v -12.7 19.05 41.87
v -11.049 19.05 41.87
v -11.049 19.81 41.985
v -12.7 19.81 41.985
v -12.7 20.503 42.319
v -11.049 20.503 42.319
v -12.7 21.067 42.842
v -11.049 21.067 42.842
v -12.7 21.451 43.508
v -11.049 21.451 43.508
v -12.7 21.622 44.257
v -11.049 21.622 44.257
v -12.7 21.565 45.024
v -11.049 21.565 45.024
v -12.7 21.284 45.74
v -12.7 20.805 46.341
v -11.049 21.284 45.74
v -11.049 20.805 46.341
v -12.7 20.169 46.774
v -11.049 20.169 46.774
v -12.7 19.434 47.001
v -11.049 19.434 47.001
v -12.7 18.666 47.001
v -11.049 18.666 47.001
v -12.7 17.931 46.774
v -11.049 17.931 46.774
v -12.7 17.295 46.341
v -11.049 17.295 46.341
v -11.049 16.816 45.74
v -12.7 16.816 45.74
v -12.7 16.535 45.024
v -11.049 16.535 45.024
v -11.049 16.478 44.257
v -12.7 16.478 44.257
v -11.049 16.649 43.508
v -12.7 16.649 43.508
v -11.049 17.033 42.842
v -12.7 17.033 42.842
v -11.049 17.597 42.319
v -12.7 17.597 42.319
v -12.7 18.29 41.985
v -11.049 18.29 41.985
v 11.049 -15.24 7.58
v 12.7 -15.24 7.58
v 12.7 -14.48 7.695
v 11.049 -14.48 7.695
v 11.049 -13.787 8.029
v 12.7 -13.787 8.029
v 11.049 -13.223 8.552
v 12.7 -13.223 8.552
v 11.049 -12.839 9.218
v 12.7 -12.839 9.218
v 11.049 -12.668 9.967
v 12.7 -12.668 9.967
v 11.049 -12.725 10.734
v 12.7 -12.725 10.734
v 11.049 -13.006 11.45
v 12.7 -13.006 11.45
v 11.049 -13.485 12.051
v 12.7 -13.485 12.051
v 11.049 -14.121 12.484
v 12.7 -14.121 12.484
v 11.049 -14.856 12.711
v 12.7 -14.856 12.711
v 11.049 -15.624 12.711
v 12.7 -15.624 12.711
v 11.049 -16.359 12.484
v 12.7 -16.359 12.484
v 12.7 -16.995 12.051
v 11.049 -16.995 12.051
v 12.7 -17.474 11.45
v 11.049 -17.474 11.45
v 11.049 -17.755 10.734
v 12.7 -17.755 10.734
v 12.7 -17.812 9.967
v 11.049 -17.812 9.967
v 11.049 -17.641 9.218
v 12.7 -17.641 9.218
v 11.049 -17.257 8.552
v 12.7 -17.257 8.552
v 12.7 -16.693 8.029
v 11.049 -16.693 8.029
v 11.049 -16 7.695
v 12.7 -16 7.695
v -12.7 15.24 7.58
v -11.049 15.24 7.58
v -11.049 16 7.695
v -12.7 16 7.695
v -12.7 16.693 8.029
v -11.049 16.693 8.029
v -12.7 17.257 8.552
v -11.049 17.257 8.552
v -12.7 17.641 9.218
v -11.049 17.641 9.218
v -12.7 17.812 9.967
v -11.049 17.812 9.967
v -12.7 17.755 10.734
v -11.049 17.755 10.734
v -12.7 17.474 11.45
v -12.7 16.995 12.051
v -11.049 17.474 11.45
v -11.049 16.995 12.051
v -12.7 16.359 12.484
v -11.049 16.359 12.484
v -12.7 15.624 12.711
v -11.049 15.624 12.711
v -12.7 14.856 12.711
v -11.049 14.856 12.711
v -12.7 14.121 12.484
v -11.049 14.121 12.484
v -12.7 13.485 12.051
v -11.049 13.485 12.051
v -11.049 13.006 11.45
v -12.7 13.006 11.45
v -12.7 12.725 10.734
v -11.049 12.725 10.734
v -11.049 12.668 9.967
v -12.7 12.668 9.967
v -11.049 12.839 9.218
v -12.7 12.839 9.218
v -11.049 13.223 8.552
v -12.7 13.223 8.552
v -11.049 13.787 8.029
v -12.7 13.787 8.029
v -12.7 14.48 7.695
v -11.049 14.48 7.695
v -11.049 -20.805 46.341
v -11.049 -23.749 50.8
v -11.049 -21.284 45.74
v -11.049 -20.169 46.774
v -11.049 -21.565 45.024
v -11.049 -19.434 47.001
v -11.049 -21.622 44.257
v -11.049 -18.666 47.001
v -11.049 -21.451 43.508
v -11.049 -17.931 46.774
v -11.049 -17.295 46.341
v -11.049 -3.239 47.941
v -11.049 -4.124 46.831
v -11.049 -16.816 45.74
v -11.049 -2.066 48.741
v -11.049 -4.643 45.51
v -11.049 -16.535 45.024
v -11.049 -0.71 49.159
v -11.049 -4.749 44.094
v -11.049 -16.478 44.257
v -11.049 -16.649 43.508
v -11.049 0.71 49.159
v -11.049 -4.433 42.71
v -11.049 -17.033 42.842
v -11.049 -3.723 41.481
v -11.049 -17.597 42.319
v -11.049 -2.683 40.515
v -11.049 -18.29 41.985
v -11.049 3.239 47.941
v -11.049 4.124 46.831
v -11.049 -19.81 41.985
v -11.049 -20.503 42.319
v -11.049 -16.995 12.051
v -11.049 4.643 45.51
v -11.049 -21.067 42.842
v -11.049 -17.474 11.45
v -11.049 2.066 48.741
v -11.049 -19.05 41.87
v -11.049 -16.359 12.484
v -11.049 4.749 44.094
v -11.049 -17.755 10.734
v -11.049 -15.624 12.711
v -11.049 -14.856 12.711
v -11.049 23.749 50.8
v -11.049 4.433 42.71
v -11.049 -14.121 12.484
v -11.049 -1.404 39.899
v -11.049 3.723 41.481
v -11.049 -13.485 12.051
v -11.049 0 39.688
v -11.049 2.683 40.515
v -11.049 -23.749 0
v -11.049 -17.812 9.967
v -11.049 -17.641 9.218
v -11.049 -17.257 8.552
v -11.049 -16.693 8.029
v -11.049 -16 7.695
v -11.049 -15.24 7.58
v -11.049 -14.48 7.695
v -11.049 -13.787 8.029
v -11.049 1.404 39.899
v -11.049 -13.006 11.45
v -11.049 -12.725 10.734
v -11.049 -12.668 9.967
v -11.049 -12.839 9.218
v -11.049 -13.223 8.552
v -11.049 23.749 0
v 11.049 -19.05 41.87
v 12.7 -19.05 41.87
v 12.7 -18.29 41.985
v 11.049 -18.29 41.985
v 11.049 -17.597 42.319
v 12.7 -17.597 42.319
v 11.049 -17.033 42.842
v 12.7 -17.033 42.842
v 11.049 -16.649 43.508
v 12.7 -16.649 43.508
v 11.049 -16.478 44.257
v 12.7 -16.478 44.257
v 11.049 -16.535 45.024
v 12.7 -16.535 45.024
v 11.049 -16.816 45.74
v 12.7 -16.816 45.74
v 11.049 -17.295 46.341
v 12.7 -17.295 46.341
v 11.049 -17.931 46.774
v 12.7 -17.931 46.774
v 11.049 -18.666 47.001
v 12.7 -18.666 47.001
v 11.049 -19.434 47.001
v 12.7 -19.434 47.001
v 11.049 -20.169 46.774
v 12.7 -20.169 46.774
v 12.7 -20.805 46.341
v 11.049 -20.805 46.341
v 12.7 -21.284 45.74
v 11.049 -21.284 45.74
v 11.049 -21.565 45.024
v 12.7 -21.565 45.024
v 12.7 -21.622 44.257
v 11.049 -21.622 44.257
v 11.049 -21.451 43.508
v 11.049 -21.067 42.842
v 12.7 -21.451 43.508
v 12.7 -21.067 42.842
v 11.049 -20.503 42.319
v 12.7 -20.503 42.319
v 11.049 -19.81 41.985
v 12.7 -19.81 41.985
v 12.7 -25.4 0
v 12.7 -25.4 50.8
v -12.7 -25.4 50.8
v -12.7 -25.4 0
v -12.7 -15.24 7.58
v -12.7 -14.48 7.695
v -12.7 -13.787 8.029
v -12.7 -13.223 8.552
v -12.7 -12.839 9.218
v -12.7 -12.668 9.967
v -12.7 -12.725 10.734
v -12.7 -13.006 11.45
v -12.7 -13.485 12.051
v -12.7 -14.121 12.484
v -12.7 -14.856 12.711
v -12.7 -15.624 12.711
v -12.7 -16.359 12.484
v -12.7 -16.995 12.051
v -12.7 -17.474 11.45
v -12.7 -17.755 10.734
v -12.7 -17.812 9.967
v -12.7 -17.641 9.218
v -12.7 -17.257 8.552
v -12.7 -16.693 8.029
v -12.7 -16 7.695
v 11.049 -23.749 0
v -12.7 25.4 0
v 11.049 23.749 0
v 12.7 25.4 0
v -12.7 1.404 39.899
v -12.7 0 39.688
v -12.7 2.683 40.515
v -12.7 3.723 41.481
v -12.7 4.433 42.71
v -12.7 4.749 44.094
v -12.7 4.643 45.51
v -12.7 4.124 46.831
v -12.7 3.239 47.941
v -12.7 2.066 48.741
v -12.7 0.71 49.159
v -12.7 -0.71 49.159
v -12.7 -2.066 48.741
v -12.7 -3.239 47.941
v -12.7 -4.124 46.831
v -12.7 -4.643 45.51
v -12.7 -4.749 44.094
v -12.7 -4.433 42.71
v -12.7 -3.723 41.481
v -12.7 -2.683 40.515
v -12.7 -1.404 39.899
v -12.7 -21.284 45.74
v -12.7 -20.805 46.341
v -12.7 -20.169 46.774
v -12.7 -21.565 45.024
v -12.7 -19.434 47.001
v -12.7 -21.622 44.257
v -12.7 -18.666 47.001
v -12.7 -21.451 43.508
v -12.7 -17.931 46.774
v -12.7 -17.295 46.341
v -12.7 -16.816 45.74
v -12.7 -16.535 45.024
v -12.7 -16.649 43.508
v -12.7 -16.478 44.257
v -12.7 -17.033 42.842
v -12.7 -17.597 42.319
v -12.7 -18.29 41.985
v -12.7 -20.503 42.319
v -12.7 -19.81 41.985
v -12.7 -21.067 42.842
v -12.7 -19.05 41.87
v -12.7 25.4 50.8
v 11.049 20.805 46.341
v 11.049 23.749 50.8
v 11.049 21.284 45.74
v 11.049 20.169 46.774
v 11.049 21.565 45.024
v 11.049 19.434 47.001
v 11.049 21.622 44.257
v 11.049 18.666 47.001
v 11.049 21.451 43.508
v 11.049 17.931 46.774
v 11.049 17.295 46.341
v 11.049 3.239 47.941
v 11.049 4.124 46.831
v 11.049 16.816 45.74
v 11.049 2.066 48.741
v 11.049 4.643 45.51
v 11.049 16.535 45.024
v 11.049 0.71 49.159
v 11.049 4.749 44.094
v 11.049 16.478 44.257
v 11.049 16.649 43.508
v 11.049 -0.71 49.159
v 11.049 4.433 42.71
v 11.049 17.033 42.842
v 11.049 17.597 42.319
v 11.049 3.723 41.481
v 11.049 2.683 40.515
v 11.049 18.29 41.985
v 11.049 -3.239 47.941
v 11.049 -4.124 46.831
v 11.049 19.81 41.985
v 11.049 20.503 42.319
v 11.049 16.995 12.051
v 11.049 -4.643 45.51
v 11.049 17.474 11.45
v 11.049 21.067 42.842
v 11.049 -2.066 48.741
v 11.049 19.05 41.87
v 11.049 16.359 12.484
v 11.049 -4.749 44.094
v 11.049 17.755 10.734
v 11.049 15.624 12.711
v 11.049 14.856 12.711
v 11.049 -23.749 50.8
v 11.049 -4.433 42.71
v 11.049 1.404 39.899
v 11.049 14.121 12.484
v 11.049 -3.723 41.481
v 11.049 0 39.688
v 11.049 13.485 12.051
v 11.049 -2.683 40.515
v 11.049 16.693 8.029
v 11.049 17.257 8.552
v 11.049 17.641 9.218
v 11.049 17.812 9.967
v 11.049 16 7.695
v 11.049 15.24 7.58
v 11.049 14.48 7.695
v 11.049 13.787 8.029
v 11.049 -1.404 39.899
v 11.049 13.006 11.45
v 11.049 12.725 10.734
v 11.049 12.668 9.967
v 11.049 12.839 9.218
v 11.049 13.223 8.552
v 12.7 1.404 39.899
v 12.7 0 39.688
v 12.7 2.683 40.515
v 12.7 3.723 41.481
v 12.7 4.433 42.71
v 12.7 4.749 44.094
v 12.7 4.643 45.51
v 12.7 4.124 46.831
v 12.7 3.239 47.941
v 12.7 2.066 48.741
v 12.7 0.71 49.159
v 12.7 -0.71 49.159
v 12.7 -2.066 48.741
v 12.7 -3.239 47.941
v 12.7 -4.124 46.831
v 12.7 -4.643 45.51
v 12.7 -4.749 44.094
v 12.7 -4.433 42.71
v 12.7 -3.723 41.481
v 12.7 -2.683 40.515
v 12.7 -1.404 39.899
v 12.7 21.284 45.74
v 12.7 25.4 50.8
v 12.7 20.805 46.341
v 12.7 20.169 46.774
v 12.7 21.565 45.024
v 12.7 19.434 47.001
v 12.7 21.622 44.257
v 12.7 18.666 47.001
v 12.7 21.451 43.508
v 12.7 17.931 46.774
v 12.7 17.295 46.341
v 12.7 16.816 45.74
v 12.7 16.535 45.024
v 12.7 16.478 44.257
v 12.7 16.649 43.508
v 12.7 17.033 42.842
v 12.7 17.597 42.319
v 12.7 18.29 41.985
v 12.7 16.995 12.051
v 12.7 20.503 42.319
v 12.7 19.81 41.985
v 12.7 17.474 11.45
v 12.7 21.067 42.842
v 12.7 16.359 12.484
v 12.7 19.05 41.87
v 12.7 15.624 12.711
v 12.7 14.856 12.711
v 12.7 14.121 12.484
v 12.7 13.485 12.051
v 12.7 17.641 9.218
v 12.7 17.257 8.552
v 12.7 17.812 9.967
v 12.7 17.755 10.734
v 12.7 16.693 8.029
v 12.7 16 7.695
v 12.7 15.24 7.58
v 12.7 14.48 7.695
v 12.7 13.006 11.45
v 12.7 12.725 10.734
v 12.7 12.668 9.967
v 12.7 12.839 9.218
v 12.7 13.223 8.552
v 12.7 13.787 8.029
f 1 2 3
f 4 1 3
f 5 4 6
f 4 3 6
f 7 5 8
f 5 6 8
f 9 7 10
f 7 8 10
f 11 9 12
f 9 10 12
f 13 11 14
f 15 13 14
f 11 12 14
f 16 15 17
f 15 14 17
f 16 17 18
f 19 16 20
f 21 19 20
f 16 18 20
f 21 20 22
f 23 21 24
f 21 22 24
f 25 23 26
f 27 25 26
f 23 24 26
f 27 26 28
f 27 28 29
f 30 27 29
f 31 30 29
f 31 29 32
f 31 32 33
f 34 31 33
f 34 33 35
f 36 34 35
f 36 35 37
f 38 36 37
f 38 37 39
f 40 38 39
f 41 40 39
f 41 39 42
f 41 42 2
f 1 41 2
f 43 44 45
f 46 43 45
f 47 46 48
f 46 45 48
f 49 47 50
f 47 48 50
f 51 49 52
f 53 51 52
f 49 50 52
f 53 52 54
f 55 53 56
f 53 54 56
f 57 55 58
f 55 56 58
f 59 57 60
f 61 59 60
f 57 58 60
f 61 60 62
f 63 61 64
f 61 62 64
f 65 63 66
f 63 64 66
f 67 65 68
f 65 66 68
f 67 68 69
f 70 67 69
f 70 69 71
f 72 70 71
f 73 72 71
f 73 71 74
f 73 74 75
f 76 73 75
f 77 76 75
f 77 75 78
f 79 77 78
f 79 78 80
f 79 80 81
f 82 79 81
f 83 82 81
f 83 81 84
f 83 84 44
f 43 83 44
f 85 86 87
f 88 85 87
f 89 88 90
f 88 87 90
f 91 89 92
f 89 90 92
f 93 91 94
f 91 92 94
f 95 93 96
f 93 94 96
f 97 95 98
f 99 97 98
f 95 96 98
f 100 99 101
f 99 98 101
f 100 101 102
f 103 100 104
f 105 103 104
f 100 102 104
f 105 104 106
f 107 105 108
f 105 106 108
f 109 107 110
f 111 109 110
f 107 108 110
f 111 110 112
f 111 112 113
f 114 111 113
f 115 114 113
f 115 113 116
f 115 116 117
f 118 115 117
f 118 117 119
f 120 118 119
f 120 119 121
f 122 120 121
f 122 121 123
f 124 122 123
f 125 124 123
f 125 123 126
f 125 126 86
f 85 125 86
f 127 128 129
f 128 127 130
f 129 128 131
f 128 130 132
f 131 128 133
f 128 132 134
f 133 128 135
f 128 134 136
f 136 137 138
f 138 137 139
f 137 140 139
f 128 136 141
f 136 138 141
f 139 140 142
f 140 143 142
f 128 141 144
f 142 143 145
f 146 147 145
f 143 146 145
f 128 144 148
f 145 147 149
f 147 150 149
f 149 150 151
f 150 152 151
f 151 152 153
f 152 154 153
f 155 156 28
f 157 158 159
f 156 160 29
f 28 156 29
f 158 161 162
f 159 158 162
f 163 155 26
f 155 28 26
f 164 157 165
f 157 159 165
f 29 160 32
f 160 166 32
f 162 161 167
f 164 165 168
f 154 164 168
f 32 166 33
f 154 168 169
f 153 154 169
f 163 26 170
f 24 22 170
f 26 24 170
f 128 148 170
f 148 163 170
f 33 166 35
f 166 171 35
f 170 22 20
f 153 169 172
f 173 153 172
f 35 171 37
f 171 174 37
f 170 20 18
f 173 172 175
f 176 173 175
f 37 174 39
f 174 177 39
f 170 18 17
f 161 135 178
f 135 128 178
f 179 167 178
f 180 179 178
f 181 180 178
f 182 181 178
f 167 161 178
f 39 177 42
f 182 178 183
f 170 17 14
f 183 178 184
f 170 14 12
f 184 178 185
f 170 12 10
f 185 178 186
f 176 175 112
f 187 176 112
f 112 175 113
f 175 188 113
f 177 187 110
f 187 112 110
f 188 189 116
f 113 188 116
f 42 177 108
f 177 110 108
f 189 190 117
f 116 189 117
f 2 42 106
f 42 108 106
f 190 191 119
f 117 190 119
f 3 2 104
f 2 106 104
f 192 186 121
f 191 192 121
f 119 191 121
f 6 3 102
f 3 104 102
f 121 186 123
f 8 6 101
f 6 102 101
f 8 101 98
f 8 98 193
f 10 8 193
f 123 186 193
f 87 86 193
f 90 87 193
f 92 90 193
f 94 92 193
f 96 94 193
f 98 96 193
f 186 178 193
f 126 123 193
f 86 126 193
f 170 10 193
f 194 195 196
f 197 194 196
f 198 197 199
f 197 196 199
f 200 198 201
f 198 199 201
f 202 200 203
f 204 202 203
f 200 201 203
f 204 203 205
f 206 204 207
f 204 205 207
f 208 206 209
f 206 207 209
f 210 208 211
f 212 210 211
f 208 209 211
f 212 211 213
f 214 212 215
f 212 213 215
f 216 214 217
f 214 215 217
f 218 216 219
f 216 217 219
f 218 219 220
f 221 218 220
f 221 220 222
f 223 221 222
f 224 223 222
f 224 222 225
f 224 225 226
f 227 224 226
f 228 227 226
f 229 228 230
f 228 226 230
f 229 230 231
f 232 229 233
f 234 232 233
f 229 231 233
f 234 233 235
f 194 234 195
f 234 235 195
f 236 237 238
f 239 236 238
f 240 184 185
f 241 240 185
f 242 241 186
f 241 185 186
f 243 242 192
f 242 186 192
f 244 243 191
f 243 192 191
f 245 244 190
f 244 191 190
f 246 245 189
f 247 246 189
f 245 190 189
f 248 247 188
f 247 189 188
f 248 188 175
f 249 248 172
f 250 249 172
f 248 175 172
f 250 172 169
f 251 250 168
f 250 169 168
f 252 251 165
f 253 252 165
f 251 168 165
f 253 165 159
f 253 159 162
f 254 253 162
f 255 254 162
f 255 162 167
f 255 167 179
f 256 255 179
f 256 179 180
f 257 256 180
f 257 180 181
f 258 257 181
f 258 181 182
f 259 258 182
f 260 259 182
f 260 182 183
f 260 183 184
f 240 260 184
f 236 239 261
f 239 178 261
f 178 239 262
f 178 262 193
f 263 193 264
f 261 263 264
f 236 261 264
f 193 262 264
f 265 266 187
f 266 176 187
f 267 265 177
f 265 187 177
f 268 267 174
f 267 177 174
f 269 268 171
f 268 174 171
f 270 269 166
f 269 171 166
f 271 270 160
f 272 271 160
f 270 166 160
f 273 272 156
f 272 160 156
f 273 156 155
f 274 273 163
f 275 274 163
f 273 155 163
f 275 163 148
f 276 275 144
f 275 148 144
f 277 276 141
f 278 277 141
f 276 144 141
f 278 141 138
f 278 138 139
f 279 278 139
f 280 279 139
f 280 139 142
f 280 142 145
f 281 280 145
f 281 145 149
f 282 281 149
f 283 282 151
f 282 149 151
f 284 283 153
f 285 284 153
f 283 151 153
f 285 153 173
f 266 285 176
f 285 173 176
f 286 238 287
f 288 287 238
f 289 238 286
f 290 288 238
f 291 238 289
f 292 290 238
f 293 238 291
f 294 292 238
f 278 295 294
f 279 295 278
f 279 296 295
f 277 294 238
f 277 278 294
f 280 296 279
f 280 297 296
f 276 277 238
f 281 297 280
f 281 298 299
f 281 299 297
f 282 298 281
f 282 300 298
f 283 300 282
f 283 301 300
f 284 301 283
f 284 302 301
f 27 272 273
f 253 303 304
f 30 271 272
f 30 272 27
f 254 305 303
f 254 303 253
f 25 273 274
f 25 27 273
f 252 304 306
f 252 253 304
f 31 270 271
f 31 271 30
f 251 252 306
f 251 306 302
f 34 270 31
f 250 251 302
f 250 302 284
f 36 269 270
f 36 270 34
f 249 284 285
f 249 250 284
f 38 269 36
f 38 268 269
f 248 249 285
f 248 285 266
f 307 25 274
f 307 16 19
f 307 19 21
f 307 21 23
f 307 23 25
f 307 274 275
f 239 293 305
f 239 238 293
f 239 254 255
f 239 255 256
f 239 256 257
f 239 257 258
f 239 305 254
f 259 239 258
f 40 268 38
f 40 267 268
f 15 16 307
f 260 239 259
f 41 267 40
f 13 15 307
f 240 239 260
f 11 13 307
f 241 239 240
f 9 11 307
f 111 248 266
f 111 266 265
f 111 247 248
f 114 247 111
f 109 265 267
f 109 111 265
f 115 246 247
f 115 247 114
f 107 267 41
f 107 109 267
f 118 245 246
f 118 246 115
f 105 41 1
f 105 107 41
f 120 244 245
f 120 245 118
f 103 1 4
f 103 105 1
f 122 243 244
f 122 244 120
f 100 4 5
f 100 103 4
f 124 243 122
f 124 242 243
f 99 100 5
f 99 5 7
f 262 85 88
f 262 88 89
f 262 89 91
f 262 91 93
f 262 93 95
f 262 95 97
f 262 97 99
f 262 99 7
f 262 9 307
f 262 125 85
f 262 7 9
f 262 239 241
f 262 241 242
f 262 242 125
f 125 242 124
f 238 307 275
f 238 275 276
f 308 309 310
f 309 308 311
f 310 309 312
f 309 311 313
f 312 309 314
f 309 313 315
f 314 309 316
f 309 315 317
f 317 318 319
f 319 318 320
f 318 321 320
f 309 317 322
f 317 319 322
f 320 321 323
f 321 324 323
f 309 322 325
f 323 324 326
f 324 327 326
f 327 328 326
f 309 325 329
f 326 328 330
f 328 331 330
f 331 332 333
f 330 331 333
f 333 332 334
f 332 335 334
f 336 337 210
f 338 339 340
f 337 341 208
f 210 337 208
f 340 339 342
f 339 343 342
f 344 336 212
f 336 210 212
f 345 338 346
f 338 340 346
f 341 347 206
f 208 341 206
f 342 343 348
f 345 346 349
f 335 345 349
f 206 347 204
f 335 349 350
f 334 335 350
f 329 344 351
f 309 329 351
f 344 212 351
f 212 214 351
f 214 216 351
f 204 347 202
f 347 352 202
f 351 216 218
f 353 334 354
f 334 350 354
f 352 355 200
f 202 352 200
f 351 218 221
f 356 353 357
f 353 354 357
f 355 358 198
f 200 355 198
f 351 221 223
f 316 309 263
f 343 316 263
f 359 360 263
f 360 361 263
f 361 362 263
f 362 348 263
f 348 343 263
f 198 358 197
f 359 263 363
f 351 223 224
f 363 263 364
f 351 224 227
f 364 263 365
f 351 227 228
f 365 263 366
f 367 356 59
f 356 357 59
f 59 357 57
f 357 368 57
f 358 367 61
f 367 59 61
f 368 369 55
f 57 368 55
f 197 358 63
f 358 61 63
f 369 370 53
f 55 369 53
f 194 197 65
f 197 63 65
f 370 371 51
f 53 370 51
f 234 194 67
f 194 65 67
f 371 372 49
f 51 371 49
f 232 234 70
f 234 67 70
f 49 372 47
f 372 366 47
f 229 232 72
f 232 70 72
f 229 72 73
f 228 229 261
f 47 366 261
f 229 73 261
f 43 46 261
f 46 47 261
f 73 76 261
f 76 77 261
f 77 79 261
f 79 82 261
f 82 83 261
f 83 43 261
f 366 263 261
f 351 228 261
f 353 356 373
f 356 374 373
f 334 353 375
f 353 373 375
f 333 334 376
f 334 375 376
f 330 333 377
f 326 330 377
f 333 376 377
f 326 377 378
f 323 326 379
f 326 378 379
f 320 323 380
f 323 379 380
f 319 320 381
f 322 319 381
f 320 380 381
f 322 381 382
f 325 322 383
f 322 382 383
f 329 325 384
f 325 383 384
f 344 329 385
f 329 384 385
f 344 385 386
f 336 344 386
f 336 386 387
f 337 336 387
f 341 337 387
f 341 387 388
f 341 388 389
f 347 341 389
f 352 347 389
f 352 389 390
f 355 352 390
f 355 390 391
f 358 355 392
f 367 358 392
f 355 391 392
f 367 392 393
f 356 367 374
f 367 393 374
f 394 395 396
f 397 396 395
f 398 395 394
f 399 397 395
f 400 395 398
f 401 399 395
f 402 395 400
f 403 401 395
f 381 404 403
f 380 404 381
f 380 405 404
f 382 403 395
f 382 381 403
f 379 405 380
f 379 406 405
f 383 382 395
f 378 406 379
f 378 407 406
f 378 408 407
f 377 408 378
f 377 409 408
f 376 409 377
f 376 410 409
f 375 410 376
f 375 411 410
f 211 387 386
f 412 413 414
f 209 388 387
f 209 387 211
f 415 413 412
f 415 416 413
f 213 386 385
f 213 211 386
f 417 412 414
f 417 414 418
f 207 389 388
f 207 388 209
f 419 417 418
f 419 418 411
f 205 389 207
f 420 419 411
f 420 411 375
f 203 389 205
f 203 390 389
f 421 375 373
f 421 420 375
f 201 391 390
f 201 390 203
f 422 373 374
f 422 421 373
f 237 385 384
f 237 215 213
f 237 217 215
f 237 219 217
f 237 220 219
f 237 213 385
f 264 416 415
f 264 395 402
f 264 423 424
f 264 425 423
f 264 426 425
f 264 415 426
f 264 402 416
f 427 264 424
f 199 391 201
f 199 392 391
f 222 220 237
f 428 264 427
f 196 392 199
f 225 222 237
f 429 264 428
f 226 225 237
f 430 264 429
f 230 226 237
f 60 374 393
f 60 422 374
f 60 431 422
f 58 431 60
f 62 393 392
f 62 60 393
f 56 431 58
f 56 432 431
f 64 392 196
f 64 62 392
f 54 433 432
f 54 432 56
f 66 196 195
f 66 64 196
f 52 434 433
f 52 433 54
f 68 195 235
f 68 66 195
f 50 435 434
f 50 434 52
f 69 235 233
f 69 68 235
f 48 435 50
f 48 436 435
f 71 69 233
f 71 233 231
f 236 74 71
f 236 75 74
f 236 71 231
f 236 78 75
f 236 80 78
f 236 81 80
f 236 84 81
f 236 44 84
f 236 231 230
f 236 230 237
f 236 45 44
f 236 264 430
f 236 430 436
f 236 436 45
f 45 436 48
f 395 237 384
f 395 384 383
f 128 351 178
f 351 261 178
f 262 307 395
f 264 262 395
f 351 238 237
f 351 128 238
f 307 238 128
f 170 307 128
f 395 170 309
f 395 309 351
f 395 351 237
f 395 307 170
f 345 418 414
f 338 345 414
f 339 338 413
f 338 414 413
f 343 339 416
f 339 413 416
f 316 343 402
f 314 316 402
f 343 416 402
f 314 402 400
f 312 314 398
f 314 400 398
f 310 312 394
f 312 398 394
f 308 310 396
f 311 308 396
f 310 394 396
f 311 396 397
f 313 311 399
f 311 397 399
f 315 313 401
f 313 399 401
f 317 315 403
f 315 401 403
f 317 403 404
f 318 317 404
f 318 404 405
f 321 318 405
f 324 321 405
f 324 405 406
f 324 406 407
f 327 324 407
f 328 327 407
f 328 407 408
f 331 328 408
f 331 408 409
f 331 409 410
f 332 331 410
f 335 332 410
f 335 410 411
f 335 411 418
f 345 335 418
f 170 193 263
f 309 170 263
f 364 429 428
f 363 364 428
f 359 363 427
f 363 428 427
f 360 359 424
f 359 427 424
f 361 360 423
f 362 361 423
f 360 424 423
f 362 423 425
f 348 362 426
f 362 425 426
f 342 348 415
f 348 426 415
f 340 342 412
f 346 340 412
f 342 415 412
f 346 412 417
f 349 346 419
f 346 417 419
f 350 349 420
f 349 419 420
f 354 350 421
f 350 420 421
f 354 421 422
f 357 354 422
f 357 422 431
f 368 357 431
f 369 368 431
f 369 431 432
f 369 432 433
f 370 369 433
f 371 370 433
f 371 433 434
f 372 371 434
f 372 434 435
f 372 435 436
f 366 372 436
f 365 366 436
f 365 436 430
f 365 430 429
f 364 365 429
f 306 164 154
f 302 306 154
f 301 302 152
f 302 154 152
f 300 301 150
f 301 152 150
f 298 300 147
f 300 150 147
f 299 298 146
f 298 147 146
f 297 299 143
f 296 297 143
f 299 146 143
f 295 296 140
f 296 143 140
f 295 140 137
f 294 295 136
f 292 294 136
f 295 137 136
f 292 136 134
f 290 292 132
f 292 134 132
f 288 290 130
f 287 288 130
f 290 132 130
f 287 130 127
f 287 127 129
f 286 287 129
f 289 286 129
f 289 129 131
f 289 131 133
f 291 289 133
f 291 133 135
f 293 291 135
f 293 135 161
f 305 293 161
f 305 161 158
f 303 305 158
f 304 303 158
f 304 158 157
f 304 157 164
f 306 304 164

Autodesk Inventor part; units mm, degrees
ref_plane "YZ Plane" through (0, 0, 0) normal (1, 0, 0) x (0, 1, 0)
ref_plane "XZ Plane" through (0, 0, 0) normal (0, 1, 0) x (-1, 0, 0)
ref_plane "XY Plane" through (0, 0, 0) normal (0, 0, 1) x (1, 0, 0)
sketch "Sketch1" plane through (0, 0, 0) normal (0, 0, 1) x (1, 0, 0)
  line L0 (12.7, -25.4) -> (-12.7, -25.4)
  line L1 (-12.7, -25.4) -> (-12.7, 25.4)
  line L2 (-12.7, 25.4) -> (12.7, 25.4)
  line L3 (12.7, 25.4) -> (12.7, -25.4)
  line L4 (11.049, -23.749) -> (-11.049, -23.749)
  line L5 (-11.049, -23.749) -> (-11.049, 23.749)
  line L6 (-11.049, 23.749) -> (11.049, 23.749)
  line L7 (11.049, 23.749) -> (11.049, -23.749)
  dimension "d0" = 25.4
  dimension "d1" = 50.8
  dimension "d2" = 1.651
  dimension "d3" = 1.651
  dimension "d4" = 1.651
  dimension "d5" = 1.651
extrude "Extrusion1" add sketch "Sketch1" along normal blind 50.8
sketch "Sketch2" plane through (12.7, -25.4, 0) normal (1, 0, 0) x (0, 0, -1)
  circle A0 centre (-44.45, 25.4) radius 4.7625
  line L0 (-50.8, 0) -> (-50.8, 50.8) projected
  line L1 (0, 0) -> (-50.8, 0) projected
  point P0 (0, 25.4)
  dimension "d8" = 9.525
  dimension "d9" = 6.35
  dimension "d10" = 25.4
extrude "Extrusion2" cut sketch "Sketch2" against normal blind 50.8
sketch "Sketch3" plane through (12.7, -25.4, 0) normal (1, 0, 0) x (0, 0, -1)
  circle A0 centre (-10.16, 10.16) radius 2.5797
  circle A1 centre (-44.45, 6.35) radius 2.5797
  circle A2 centre (-44.45, 44.45) radius 2.5797
  circle A3 centre (-10.16, 40.64) radius 2.5797
  line L0 (0, 50.8) -> (-50.8, 50.8) projected
  line L1 (0, 50.8) -> (0, 0) projected
  line L2 (0, 0) -> (-50.8, 0) projected
  line L3 (-50.8, 0) -> (-50.8, 50.8) projected
  point P0 (0, 25.4)
  dimension "d13" = 10.16
  dimension "d14" = 10.16
  dimension "d15" = 6.35
  dimension "d16" = 6.35
  dimension "d17" = 6.35
  dimension "d18" = 6.35
  dimension "d19" = 10.16
  dimension "d20" = 10.16
  dimension "d21" = 5.1594
  dimension "d22" = 5.1594
  dimension "d23" = 5.1594
  dimension "d24" = 5.1594
extrude "Extrusion3" cut sketch "Sketch3" against normal blind 50.8 contours A0 | A1 | A2 | A3
equation "\"d3\" = d2"
equation "\"d5\" = d3"
equation "\"d14\" = d13"
equation "\"d16\" = d15"
equation "\"d17\" = d15"
equation "\"d18\" = d15"
equation "\"d19\" = d13"
equation "\"d20\" = d13"
equation "\"d22\" = d21"
equation "\"d23\" = d21"
equation "\"d24\" = d21"
properties part number "back support bearing holder"
